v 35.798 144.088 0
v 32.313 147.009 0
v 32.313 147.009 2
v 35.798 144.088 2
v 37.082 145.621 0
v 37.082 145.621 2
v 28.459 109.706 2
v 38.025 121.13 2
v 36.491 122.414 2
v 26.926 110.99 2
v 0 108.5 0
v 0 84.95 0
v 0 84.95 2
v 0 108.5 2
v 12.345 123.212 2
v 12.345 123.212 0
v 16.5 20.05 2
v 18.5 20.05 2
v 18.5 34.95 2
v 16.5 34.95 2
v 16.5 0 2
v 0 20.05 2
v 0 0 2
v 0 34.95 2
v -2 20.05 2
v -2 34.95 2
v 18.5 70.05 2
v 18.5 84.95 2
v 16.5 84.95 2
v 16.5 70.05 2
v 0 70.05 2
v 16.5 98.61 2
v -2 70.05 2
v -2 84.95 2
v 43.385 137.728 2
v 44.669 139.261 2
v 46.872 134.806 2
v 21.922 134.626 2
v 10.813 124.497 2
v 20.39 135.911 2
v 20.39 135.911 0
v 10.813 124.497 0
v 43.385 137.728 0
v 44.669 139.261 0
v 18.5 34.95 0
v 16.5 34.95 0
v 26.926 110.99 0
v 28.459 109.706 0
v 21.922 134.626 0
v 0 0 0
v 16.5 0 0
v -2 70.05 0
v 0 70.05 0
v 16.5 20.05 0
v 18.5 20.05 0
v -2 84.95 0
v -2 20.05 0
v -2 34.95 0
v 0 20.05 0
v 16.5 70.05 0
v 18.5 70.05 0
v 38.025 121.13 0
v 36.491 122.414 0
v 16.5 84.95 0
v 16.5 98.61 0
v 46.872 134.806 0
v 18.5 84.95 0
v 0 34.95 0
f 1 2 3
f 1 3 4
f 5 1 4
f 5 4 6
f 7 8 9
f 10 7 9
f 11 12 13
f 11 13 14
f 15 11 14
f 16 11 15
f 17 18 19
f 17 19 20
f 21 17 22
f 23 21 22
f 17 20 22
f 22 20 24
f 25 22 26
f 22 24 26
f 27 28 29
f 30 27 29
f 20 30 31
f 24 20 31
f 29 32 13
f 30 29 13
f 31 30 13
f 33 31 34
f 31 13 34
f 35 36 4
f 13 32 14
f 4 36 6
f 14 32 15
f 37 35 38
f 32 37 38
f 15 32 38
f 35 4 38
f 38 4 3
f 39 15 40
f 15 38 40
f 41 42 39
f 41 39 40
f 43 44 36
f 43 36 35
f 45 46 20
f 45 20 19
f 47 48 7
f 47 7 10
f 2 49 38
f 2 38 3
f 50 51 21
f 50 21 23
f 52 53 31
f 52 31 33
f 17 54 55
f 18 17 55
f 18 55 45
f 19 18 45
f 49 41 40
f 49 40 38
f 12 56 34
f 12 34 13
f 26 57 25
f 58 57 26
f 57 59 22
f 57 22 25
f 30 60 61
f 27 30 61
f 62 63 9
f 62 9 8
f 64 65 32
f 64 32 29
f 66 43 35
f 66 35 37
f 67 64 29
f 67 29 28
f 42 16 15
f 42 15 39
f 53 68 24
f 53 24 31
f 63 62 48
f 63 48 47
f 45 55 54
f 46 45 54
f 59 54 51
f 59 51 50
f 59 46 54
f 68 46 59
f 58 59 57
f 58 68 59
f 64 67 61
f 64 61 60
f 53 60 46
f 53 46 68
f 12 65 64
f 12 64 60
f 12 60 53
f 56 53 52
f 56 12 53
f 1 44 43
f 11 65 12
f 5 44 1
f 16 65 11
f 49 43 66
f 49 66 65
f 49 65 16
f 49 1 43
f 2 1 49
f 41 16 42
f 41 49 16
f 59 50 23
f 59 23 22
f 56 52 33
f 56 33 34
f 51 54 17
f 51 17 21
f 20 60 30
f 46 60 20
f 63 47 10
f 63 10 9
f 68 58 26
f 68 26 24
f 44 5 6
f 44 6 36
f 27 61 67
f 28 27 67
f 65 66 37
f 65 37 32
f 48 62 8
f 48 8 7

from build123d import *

# Parameters (mm, degrees)
SKETCH1_W           = 2
SKETCH1_H           = 14.9
BOSS_EXTRUDE2_DEPTH = 2


with BuildPart() as part:
    # Sketch1 → Boss-Extrude2 (new body)
    with BuildSketch(Plane.XY):
        Polygon((43.384701574, 137.728482154), (46.871714558, 134.805599937), (16.5, 98.61), (16.5, 0), (0, 0), (0, 20.05), (-2, 20.05), (-2, 34.95), (0, 34.95), (0, 70.05), (-2, 70.05), (-2, 84.95), (0, 84.95), (0, 108.5), (12.344617782, 123.211742591), (10.812528896, 124.497317811), (20.39006428, 135.911380013), (21.922153167, 134.625804794), (32.312933139, 147.009054156), (35.797574423, 144.088159944), (37.082357815, 145.620912904), (44.669484966, 139.261235114), align=None)
        with Locations((17.5, 77.5)):
            Rectangle(SKETCH1_W, SKETCH1_H)
        with Locations((17.5, 27.5)):
            Rectangle(SKETCH1_W, SKETCH1_H)
        Polygon((36.491365695, 122.413607016), (38.024782319, 121.129615795), (28.45904772, 109.705661945), (26.925631095, 110.989653166), align=None)
    extrude(amount=BOSS_EXTRUDE2_DEPTH)


solid = part.part
